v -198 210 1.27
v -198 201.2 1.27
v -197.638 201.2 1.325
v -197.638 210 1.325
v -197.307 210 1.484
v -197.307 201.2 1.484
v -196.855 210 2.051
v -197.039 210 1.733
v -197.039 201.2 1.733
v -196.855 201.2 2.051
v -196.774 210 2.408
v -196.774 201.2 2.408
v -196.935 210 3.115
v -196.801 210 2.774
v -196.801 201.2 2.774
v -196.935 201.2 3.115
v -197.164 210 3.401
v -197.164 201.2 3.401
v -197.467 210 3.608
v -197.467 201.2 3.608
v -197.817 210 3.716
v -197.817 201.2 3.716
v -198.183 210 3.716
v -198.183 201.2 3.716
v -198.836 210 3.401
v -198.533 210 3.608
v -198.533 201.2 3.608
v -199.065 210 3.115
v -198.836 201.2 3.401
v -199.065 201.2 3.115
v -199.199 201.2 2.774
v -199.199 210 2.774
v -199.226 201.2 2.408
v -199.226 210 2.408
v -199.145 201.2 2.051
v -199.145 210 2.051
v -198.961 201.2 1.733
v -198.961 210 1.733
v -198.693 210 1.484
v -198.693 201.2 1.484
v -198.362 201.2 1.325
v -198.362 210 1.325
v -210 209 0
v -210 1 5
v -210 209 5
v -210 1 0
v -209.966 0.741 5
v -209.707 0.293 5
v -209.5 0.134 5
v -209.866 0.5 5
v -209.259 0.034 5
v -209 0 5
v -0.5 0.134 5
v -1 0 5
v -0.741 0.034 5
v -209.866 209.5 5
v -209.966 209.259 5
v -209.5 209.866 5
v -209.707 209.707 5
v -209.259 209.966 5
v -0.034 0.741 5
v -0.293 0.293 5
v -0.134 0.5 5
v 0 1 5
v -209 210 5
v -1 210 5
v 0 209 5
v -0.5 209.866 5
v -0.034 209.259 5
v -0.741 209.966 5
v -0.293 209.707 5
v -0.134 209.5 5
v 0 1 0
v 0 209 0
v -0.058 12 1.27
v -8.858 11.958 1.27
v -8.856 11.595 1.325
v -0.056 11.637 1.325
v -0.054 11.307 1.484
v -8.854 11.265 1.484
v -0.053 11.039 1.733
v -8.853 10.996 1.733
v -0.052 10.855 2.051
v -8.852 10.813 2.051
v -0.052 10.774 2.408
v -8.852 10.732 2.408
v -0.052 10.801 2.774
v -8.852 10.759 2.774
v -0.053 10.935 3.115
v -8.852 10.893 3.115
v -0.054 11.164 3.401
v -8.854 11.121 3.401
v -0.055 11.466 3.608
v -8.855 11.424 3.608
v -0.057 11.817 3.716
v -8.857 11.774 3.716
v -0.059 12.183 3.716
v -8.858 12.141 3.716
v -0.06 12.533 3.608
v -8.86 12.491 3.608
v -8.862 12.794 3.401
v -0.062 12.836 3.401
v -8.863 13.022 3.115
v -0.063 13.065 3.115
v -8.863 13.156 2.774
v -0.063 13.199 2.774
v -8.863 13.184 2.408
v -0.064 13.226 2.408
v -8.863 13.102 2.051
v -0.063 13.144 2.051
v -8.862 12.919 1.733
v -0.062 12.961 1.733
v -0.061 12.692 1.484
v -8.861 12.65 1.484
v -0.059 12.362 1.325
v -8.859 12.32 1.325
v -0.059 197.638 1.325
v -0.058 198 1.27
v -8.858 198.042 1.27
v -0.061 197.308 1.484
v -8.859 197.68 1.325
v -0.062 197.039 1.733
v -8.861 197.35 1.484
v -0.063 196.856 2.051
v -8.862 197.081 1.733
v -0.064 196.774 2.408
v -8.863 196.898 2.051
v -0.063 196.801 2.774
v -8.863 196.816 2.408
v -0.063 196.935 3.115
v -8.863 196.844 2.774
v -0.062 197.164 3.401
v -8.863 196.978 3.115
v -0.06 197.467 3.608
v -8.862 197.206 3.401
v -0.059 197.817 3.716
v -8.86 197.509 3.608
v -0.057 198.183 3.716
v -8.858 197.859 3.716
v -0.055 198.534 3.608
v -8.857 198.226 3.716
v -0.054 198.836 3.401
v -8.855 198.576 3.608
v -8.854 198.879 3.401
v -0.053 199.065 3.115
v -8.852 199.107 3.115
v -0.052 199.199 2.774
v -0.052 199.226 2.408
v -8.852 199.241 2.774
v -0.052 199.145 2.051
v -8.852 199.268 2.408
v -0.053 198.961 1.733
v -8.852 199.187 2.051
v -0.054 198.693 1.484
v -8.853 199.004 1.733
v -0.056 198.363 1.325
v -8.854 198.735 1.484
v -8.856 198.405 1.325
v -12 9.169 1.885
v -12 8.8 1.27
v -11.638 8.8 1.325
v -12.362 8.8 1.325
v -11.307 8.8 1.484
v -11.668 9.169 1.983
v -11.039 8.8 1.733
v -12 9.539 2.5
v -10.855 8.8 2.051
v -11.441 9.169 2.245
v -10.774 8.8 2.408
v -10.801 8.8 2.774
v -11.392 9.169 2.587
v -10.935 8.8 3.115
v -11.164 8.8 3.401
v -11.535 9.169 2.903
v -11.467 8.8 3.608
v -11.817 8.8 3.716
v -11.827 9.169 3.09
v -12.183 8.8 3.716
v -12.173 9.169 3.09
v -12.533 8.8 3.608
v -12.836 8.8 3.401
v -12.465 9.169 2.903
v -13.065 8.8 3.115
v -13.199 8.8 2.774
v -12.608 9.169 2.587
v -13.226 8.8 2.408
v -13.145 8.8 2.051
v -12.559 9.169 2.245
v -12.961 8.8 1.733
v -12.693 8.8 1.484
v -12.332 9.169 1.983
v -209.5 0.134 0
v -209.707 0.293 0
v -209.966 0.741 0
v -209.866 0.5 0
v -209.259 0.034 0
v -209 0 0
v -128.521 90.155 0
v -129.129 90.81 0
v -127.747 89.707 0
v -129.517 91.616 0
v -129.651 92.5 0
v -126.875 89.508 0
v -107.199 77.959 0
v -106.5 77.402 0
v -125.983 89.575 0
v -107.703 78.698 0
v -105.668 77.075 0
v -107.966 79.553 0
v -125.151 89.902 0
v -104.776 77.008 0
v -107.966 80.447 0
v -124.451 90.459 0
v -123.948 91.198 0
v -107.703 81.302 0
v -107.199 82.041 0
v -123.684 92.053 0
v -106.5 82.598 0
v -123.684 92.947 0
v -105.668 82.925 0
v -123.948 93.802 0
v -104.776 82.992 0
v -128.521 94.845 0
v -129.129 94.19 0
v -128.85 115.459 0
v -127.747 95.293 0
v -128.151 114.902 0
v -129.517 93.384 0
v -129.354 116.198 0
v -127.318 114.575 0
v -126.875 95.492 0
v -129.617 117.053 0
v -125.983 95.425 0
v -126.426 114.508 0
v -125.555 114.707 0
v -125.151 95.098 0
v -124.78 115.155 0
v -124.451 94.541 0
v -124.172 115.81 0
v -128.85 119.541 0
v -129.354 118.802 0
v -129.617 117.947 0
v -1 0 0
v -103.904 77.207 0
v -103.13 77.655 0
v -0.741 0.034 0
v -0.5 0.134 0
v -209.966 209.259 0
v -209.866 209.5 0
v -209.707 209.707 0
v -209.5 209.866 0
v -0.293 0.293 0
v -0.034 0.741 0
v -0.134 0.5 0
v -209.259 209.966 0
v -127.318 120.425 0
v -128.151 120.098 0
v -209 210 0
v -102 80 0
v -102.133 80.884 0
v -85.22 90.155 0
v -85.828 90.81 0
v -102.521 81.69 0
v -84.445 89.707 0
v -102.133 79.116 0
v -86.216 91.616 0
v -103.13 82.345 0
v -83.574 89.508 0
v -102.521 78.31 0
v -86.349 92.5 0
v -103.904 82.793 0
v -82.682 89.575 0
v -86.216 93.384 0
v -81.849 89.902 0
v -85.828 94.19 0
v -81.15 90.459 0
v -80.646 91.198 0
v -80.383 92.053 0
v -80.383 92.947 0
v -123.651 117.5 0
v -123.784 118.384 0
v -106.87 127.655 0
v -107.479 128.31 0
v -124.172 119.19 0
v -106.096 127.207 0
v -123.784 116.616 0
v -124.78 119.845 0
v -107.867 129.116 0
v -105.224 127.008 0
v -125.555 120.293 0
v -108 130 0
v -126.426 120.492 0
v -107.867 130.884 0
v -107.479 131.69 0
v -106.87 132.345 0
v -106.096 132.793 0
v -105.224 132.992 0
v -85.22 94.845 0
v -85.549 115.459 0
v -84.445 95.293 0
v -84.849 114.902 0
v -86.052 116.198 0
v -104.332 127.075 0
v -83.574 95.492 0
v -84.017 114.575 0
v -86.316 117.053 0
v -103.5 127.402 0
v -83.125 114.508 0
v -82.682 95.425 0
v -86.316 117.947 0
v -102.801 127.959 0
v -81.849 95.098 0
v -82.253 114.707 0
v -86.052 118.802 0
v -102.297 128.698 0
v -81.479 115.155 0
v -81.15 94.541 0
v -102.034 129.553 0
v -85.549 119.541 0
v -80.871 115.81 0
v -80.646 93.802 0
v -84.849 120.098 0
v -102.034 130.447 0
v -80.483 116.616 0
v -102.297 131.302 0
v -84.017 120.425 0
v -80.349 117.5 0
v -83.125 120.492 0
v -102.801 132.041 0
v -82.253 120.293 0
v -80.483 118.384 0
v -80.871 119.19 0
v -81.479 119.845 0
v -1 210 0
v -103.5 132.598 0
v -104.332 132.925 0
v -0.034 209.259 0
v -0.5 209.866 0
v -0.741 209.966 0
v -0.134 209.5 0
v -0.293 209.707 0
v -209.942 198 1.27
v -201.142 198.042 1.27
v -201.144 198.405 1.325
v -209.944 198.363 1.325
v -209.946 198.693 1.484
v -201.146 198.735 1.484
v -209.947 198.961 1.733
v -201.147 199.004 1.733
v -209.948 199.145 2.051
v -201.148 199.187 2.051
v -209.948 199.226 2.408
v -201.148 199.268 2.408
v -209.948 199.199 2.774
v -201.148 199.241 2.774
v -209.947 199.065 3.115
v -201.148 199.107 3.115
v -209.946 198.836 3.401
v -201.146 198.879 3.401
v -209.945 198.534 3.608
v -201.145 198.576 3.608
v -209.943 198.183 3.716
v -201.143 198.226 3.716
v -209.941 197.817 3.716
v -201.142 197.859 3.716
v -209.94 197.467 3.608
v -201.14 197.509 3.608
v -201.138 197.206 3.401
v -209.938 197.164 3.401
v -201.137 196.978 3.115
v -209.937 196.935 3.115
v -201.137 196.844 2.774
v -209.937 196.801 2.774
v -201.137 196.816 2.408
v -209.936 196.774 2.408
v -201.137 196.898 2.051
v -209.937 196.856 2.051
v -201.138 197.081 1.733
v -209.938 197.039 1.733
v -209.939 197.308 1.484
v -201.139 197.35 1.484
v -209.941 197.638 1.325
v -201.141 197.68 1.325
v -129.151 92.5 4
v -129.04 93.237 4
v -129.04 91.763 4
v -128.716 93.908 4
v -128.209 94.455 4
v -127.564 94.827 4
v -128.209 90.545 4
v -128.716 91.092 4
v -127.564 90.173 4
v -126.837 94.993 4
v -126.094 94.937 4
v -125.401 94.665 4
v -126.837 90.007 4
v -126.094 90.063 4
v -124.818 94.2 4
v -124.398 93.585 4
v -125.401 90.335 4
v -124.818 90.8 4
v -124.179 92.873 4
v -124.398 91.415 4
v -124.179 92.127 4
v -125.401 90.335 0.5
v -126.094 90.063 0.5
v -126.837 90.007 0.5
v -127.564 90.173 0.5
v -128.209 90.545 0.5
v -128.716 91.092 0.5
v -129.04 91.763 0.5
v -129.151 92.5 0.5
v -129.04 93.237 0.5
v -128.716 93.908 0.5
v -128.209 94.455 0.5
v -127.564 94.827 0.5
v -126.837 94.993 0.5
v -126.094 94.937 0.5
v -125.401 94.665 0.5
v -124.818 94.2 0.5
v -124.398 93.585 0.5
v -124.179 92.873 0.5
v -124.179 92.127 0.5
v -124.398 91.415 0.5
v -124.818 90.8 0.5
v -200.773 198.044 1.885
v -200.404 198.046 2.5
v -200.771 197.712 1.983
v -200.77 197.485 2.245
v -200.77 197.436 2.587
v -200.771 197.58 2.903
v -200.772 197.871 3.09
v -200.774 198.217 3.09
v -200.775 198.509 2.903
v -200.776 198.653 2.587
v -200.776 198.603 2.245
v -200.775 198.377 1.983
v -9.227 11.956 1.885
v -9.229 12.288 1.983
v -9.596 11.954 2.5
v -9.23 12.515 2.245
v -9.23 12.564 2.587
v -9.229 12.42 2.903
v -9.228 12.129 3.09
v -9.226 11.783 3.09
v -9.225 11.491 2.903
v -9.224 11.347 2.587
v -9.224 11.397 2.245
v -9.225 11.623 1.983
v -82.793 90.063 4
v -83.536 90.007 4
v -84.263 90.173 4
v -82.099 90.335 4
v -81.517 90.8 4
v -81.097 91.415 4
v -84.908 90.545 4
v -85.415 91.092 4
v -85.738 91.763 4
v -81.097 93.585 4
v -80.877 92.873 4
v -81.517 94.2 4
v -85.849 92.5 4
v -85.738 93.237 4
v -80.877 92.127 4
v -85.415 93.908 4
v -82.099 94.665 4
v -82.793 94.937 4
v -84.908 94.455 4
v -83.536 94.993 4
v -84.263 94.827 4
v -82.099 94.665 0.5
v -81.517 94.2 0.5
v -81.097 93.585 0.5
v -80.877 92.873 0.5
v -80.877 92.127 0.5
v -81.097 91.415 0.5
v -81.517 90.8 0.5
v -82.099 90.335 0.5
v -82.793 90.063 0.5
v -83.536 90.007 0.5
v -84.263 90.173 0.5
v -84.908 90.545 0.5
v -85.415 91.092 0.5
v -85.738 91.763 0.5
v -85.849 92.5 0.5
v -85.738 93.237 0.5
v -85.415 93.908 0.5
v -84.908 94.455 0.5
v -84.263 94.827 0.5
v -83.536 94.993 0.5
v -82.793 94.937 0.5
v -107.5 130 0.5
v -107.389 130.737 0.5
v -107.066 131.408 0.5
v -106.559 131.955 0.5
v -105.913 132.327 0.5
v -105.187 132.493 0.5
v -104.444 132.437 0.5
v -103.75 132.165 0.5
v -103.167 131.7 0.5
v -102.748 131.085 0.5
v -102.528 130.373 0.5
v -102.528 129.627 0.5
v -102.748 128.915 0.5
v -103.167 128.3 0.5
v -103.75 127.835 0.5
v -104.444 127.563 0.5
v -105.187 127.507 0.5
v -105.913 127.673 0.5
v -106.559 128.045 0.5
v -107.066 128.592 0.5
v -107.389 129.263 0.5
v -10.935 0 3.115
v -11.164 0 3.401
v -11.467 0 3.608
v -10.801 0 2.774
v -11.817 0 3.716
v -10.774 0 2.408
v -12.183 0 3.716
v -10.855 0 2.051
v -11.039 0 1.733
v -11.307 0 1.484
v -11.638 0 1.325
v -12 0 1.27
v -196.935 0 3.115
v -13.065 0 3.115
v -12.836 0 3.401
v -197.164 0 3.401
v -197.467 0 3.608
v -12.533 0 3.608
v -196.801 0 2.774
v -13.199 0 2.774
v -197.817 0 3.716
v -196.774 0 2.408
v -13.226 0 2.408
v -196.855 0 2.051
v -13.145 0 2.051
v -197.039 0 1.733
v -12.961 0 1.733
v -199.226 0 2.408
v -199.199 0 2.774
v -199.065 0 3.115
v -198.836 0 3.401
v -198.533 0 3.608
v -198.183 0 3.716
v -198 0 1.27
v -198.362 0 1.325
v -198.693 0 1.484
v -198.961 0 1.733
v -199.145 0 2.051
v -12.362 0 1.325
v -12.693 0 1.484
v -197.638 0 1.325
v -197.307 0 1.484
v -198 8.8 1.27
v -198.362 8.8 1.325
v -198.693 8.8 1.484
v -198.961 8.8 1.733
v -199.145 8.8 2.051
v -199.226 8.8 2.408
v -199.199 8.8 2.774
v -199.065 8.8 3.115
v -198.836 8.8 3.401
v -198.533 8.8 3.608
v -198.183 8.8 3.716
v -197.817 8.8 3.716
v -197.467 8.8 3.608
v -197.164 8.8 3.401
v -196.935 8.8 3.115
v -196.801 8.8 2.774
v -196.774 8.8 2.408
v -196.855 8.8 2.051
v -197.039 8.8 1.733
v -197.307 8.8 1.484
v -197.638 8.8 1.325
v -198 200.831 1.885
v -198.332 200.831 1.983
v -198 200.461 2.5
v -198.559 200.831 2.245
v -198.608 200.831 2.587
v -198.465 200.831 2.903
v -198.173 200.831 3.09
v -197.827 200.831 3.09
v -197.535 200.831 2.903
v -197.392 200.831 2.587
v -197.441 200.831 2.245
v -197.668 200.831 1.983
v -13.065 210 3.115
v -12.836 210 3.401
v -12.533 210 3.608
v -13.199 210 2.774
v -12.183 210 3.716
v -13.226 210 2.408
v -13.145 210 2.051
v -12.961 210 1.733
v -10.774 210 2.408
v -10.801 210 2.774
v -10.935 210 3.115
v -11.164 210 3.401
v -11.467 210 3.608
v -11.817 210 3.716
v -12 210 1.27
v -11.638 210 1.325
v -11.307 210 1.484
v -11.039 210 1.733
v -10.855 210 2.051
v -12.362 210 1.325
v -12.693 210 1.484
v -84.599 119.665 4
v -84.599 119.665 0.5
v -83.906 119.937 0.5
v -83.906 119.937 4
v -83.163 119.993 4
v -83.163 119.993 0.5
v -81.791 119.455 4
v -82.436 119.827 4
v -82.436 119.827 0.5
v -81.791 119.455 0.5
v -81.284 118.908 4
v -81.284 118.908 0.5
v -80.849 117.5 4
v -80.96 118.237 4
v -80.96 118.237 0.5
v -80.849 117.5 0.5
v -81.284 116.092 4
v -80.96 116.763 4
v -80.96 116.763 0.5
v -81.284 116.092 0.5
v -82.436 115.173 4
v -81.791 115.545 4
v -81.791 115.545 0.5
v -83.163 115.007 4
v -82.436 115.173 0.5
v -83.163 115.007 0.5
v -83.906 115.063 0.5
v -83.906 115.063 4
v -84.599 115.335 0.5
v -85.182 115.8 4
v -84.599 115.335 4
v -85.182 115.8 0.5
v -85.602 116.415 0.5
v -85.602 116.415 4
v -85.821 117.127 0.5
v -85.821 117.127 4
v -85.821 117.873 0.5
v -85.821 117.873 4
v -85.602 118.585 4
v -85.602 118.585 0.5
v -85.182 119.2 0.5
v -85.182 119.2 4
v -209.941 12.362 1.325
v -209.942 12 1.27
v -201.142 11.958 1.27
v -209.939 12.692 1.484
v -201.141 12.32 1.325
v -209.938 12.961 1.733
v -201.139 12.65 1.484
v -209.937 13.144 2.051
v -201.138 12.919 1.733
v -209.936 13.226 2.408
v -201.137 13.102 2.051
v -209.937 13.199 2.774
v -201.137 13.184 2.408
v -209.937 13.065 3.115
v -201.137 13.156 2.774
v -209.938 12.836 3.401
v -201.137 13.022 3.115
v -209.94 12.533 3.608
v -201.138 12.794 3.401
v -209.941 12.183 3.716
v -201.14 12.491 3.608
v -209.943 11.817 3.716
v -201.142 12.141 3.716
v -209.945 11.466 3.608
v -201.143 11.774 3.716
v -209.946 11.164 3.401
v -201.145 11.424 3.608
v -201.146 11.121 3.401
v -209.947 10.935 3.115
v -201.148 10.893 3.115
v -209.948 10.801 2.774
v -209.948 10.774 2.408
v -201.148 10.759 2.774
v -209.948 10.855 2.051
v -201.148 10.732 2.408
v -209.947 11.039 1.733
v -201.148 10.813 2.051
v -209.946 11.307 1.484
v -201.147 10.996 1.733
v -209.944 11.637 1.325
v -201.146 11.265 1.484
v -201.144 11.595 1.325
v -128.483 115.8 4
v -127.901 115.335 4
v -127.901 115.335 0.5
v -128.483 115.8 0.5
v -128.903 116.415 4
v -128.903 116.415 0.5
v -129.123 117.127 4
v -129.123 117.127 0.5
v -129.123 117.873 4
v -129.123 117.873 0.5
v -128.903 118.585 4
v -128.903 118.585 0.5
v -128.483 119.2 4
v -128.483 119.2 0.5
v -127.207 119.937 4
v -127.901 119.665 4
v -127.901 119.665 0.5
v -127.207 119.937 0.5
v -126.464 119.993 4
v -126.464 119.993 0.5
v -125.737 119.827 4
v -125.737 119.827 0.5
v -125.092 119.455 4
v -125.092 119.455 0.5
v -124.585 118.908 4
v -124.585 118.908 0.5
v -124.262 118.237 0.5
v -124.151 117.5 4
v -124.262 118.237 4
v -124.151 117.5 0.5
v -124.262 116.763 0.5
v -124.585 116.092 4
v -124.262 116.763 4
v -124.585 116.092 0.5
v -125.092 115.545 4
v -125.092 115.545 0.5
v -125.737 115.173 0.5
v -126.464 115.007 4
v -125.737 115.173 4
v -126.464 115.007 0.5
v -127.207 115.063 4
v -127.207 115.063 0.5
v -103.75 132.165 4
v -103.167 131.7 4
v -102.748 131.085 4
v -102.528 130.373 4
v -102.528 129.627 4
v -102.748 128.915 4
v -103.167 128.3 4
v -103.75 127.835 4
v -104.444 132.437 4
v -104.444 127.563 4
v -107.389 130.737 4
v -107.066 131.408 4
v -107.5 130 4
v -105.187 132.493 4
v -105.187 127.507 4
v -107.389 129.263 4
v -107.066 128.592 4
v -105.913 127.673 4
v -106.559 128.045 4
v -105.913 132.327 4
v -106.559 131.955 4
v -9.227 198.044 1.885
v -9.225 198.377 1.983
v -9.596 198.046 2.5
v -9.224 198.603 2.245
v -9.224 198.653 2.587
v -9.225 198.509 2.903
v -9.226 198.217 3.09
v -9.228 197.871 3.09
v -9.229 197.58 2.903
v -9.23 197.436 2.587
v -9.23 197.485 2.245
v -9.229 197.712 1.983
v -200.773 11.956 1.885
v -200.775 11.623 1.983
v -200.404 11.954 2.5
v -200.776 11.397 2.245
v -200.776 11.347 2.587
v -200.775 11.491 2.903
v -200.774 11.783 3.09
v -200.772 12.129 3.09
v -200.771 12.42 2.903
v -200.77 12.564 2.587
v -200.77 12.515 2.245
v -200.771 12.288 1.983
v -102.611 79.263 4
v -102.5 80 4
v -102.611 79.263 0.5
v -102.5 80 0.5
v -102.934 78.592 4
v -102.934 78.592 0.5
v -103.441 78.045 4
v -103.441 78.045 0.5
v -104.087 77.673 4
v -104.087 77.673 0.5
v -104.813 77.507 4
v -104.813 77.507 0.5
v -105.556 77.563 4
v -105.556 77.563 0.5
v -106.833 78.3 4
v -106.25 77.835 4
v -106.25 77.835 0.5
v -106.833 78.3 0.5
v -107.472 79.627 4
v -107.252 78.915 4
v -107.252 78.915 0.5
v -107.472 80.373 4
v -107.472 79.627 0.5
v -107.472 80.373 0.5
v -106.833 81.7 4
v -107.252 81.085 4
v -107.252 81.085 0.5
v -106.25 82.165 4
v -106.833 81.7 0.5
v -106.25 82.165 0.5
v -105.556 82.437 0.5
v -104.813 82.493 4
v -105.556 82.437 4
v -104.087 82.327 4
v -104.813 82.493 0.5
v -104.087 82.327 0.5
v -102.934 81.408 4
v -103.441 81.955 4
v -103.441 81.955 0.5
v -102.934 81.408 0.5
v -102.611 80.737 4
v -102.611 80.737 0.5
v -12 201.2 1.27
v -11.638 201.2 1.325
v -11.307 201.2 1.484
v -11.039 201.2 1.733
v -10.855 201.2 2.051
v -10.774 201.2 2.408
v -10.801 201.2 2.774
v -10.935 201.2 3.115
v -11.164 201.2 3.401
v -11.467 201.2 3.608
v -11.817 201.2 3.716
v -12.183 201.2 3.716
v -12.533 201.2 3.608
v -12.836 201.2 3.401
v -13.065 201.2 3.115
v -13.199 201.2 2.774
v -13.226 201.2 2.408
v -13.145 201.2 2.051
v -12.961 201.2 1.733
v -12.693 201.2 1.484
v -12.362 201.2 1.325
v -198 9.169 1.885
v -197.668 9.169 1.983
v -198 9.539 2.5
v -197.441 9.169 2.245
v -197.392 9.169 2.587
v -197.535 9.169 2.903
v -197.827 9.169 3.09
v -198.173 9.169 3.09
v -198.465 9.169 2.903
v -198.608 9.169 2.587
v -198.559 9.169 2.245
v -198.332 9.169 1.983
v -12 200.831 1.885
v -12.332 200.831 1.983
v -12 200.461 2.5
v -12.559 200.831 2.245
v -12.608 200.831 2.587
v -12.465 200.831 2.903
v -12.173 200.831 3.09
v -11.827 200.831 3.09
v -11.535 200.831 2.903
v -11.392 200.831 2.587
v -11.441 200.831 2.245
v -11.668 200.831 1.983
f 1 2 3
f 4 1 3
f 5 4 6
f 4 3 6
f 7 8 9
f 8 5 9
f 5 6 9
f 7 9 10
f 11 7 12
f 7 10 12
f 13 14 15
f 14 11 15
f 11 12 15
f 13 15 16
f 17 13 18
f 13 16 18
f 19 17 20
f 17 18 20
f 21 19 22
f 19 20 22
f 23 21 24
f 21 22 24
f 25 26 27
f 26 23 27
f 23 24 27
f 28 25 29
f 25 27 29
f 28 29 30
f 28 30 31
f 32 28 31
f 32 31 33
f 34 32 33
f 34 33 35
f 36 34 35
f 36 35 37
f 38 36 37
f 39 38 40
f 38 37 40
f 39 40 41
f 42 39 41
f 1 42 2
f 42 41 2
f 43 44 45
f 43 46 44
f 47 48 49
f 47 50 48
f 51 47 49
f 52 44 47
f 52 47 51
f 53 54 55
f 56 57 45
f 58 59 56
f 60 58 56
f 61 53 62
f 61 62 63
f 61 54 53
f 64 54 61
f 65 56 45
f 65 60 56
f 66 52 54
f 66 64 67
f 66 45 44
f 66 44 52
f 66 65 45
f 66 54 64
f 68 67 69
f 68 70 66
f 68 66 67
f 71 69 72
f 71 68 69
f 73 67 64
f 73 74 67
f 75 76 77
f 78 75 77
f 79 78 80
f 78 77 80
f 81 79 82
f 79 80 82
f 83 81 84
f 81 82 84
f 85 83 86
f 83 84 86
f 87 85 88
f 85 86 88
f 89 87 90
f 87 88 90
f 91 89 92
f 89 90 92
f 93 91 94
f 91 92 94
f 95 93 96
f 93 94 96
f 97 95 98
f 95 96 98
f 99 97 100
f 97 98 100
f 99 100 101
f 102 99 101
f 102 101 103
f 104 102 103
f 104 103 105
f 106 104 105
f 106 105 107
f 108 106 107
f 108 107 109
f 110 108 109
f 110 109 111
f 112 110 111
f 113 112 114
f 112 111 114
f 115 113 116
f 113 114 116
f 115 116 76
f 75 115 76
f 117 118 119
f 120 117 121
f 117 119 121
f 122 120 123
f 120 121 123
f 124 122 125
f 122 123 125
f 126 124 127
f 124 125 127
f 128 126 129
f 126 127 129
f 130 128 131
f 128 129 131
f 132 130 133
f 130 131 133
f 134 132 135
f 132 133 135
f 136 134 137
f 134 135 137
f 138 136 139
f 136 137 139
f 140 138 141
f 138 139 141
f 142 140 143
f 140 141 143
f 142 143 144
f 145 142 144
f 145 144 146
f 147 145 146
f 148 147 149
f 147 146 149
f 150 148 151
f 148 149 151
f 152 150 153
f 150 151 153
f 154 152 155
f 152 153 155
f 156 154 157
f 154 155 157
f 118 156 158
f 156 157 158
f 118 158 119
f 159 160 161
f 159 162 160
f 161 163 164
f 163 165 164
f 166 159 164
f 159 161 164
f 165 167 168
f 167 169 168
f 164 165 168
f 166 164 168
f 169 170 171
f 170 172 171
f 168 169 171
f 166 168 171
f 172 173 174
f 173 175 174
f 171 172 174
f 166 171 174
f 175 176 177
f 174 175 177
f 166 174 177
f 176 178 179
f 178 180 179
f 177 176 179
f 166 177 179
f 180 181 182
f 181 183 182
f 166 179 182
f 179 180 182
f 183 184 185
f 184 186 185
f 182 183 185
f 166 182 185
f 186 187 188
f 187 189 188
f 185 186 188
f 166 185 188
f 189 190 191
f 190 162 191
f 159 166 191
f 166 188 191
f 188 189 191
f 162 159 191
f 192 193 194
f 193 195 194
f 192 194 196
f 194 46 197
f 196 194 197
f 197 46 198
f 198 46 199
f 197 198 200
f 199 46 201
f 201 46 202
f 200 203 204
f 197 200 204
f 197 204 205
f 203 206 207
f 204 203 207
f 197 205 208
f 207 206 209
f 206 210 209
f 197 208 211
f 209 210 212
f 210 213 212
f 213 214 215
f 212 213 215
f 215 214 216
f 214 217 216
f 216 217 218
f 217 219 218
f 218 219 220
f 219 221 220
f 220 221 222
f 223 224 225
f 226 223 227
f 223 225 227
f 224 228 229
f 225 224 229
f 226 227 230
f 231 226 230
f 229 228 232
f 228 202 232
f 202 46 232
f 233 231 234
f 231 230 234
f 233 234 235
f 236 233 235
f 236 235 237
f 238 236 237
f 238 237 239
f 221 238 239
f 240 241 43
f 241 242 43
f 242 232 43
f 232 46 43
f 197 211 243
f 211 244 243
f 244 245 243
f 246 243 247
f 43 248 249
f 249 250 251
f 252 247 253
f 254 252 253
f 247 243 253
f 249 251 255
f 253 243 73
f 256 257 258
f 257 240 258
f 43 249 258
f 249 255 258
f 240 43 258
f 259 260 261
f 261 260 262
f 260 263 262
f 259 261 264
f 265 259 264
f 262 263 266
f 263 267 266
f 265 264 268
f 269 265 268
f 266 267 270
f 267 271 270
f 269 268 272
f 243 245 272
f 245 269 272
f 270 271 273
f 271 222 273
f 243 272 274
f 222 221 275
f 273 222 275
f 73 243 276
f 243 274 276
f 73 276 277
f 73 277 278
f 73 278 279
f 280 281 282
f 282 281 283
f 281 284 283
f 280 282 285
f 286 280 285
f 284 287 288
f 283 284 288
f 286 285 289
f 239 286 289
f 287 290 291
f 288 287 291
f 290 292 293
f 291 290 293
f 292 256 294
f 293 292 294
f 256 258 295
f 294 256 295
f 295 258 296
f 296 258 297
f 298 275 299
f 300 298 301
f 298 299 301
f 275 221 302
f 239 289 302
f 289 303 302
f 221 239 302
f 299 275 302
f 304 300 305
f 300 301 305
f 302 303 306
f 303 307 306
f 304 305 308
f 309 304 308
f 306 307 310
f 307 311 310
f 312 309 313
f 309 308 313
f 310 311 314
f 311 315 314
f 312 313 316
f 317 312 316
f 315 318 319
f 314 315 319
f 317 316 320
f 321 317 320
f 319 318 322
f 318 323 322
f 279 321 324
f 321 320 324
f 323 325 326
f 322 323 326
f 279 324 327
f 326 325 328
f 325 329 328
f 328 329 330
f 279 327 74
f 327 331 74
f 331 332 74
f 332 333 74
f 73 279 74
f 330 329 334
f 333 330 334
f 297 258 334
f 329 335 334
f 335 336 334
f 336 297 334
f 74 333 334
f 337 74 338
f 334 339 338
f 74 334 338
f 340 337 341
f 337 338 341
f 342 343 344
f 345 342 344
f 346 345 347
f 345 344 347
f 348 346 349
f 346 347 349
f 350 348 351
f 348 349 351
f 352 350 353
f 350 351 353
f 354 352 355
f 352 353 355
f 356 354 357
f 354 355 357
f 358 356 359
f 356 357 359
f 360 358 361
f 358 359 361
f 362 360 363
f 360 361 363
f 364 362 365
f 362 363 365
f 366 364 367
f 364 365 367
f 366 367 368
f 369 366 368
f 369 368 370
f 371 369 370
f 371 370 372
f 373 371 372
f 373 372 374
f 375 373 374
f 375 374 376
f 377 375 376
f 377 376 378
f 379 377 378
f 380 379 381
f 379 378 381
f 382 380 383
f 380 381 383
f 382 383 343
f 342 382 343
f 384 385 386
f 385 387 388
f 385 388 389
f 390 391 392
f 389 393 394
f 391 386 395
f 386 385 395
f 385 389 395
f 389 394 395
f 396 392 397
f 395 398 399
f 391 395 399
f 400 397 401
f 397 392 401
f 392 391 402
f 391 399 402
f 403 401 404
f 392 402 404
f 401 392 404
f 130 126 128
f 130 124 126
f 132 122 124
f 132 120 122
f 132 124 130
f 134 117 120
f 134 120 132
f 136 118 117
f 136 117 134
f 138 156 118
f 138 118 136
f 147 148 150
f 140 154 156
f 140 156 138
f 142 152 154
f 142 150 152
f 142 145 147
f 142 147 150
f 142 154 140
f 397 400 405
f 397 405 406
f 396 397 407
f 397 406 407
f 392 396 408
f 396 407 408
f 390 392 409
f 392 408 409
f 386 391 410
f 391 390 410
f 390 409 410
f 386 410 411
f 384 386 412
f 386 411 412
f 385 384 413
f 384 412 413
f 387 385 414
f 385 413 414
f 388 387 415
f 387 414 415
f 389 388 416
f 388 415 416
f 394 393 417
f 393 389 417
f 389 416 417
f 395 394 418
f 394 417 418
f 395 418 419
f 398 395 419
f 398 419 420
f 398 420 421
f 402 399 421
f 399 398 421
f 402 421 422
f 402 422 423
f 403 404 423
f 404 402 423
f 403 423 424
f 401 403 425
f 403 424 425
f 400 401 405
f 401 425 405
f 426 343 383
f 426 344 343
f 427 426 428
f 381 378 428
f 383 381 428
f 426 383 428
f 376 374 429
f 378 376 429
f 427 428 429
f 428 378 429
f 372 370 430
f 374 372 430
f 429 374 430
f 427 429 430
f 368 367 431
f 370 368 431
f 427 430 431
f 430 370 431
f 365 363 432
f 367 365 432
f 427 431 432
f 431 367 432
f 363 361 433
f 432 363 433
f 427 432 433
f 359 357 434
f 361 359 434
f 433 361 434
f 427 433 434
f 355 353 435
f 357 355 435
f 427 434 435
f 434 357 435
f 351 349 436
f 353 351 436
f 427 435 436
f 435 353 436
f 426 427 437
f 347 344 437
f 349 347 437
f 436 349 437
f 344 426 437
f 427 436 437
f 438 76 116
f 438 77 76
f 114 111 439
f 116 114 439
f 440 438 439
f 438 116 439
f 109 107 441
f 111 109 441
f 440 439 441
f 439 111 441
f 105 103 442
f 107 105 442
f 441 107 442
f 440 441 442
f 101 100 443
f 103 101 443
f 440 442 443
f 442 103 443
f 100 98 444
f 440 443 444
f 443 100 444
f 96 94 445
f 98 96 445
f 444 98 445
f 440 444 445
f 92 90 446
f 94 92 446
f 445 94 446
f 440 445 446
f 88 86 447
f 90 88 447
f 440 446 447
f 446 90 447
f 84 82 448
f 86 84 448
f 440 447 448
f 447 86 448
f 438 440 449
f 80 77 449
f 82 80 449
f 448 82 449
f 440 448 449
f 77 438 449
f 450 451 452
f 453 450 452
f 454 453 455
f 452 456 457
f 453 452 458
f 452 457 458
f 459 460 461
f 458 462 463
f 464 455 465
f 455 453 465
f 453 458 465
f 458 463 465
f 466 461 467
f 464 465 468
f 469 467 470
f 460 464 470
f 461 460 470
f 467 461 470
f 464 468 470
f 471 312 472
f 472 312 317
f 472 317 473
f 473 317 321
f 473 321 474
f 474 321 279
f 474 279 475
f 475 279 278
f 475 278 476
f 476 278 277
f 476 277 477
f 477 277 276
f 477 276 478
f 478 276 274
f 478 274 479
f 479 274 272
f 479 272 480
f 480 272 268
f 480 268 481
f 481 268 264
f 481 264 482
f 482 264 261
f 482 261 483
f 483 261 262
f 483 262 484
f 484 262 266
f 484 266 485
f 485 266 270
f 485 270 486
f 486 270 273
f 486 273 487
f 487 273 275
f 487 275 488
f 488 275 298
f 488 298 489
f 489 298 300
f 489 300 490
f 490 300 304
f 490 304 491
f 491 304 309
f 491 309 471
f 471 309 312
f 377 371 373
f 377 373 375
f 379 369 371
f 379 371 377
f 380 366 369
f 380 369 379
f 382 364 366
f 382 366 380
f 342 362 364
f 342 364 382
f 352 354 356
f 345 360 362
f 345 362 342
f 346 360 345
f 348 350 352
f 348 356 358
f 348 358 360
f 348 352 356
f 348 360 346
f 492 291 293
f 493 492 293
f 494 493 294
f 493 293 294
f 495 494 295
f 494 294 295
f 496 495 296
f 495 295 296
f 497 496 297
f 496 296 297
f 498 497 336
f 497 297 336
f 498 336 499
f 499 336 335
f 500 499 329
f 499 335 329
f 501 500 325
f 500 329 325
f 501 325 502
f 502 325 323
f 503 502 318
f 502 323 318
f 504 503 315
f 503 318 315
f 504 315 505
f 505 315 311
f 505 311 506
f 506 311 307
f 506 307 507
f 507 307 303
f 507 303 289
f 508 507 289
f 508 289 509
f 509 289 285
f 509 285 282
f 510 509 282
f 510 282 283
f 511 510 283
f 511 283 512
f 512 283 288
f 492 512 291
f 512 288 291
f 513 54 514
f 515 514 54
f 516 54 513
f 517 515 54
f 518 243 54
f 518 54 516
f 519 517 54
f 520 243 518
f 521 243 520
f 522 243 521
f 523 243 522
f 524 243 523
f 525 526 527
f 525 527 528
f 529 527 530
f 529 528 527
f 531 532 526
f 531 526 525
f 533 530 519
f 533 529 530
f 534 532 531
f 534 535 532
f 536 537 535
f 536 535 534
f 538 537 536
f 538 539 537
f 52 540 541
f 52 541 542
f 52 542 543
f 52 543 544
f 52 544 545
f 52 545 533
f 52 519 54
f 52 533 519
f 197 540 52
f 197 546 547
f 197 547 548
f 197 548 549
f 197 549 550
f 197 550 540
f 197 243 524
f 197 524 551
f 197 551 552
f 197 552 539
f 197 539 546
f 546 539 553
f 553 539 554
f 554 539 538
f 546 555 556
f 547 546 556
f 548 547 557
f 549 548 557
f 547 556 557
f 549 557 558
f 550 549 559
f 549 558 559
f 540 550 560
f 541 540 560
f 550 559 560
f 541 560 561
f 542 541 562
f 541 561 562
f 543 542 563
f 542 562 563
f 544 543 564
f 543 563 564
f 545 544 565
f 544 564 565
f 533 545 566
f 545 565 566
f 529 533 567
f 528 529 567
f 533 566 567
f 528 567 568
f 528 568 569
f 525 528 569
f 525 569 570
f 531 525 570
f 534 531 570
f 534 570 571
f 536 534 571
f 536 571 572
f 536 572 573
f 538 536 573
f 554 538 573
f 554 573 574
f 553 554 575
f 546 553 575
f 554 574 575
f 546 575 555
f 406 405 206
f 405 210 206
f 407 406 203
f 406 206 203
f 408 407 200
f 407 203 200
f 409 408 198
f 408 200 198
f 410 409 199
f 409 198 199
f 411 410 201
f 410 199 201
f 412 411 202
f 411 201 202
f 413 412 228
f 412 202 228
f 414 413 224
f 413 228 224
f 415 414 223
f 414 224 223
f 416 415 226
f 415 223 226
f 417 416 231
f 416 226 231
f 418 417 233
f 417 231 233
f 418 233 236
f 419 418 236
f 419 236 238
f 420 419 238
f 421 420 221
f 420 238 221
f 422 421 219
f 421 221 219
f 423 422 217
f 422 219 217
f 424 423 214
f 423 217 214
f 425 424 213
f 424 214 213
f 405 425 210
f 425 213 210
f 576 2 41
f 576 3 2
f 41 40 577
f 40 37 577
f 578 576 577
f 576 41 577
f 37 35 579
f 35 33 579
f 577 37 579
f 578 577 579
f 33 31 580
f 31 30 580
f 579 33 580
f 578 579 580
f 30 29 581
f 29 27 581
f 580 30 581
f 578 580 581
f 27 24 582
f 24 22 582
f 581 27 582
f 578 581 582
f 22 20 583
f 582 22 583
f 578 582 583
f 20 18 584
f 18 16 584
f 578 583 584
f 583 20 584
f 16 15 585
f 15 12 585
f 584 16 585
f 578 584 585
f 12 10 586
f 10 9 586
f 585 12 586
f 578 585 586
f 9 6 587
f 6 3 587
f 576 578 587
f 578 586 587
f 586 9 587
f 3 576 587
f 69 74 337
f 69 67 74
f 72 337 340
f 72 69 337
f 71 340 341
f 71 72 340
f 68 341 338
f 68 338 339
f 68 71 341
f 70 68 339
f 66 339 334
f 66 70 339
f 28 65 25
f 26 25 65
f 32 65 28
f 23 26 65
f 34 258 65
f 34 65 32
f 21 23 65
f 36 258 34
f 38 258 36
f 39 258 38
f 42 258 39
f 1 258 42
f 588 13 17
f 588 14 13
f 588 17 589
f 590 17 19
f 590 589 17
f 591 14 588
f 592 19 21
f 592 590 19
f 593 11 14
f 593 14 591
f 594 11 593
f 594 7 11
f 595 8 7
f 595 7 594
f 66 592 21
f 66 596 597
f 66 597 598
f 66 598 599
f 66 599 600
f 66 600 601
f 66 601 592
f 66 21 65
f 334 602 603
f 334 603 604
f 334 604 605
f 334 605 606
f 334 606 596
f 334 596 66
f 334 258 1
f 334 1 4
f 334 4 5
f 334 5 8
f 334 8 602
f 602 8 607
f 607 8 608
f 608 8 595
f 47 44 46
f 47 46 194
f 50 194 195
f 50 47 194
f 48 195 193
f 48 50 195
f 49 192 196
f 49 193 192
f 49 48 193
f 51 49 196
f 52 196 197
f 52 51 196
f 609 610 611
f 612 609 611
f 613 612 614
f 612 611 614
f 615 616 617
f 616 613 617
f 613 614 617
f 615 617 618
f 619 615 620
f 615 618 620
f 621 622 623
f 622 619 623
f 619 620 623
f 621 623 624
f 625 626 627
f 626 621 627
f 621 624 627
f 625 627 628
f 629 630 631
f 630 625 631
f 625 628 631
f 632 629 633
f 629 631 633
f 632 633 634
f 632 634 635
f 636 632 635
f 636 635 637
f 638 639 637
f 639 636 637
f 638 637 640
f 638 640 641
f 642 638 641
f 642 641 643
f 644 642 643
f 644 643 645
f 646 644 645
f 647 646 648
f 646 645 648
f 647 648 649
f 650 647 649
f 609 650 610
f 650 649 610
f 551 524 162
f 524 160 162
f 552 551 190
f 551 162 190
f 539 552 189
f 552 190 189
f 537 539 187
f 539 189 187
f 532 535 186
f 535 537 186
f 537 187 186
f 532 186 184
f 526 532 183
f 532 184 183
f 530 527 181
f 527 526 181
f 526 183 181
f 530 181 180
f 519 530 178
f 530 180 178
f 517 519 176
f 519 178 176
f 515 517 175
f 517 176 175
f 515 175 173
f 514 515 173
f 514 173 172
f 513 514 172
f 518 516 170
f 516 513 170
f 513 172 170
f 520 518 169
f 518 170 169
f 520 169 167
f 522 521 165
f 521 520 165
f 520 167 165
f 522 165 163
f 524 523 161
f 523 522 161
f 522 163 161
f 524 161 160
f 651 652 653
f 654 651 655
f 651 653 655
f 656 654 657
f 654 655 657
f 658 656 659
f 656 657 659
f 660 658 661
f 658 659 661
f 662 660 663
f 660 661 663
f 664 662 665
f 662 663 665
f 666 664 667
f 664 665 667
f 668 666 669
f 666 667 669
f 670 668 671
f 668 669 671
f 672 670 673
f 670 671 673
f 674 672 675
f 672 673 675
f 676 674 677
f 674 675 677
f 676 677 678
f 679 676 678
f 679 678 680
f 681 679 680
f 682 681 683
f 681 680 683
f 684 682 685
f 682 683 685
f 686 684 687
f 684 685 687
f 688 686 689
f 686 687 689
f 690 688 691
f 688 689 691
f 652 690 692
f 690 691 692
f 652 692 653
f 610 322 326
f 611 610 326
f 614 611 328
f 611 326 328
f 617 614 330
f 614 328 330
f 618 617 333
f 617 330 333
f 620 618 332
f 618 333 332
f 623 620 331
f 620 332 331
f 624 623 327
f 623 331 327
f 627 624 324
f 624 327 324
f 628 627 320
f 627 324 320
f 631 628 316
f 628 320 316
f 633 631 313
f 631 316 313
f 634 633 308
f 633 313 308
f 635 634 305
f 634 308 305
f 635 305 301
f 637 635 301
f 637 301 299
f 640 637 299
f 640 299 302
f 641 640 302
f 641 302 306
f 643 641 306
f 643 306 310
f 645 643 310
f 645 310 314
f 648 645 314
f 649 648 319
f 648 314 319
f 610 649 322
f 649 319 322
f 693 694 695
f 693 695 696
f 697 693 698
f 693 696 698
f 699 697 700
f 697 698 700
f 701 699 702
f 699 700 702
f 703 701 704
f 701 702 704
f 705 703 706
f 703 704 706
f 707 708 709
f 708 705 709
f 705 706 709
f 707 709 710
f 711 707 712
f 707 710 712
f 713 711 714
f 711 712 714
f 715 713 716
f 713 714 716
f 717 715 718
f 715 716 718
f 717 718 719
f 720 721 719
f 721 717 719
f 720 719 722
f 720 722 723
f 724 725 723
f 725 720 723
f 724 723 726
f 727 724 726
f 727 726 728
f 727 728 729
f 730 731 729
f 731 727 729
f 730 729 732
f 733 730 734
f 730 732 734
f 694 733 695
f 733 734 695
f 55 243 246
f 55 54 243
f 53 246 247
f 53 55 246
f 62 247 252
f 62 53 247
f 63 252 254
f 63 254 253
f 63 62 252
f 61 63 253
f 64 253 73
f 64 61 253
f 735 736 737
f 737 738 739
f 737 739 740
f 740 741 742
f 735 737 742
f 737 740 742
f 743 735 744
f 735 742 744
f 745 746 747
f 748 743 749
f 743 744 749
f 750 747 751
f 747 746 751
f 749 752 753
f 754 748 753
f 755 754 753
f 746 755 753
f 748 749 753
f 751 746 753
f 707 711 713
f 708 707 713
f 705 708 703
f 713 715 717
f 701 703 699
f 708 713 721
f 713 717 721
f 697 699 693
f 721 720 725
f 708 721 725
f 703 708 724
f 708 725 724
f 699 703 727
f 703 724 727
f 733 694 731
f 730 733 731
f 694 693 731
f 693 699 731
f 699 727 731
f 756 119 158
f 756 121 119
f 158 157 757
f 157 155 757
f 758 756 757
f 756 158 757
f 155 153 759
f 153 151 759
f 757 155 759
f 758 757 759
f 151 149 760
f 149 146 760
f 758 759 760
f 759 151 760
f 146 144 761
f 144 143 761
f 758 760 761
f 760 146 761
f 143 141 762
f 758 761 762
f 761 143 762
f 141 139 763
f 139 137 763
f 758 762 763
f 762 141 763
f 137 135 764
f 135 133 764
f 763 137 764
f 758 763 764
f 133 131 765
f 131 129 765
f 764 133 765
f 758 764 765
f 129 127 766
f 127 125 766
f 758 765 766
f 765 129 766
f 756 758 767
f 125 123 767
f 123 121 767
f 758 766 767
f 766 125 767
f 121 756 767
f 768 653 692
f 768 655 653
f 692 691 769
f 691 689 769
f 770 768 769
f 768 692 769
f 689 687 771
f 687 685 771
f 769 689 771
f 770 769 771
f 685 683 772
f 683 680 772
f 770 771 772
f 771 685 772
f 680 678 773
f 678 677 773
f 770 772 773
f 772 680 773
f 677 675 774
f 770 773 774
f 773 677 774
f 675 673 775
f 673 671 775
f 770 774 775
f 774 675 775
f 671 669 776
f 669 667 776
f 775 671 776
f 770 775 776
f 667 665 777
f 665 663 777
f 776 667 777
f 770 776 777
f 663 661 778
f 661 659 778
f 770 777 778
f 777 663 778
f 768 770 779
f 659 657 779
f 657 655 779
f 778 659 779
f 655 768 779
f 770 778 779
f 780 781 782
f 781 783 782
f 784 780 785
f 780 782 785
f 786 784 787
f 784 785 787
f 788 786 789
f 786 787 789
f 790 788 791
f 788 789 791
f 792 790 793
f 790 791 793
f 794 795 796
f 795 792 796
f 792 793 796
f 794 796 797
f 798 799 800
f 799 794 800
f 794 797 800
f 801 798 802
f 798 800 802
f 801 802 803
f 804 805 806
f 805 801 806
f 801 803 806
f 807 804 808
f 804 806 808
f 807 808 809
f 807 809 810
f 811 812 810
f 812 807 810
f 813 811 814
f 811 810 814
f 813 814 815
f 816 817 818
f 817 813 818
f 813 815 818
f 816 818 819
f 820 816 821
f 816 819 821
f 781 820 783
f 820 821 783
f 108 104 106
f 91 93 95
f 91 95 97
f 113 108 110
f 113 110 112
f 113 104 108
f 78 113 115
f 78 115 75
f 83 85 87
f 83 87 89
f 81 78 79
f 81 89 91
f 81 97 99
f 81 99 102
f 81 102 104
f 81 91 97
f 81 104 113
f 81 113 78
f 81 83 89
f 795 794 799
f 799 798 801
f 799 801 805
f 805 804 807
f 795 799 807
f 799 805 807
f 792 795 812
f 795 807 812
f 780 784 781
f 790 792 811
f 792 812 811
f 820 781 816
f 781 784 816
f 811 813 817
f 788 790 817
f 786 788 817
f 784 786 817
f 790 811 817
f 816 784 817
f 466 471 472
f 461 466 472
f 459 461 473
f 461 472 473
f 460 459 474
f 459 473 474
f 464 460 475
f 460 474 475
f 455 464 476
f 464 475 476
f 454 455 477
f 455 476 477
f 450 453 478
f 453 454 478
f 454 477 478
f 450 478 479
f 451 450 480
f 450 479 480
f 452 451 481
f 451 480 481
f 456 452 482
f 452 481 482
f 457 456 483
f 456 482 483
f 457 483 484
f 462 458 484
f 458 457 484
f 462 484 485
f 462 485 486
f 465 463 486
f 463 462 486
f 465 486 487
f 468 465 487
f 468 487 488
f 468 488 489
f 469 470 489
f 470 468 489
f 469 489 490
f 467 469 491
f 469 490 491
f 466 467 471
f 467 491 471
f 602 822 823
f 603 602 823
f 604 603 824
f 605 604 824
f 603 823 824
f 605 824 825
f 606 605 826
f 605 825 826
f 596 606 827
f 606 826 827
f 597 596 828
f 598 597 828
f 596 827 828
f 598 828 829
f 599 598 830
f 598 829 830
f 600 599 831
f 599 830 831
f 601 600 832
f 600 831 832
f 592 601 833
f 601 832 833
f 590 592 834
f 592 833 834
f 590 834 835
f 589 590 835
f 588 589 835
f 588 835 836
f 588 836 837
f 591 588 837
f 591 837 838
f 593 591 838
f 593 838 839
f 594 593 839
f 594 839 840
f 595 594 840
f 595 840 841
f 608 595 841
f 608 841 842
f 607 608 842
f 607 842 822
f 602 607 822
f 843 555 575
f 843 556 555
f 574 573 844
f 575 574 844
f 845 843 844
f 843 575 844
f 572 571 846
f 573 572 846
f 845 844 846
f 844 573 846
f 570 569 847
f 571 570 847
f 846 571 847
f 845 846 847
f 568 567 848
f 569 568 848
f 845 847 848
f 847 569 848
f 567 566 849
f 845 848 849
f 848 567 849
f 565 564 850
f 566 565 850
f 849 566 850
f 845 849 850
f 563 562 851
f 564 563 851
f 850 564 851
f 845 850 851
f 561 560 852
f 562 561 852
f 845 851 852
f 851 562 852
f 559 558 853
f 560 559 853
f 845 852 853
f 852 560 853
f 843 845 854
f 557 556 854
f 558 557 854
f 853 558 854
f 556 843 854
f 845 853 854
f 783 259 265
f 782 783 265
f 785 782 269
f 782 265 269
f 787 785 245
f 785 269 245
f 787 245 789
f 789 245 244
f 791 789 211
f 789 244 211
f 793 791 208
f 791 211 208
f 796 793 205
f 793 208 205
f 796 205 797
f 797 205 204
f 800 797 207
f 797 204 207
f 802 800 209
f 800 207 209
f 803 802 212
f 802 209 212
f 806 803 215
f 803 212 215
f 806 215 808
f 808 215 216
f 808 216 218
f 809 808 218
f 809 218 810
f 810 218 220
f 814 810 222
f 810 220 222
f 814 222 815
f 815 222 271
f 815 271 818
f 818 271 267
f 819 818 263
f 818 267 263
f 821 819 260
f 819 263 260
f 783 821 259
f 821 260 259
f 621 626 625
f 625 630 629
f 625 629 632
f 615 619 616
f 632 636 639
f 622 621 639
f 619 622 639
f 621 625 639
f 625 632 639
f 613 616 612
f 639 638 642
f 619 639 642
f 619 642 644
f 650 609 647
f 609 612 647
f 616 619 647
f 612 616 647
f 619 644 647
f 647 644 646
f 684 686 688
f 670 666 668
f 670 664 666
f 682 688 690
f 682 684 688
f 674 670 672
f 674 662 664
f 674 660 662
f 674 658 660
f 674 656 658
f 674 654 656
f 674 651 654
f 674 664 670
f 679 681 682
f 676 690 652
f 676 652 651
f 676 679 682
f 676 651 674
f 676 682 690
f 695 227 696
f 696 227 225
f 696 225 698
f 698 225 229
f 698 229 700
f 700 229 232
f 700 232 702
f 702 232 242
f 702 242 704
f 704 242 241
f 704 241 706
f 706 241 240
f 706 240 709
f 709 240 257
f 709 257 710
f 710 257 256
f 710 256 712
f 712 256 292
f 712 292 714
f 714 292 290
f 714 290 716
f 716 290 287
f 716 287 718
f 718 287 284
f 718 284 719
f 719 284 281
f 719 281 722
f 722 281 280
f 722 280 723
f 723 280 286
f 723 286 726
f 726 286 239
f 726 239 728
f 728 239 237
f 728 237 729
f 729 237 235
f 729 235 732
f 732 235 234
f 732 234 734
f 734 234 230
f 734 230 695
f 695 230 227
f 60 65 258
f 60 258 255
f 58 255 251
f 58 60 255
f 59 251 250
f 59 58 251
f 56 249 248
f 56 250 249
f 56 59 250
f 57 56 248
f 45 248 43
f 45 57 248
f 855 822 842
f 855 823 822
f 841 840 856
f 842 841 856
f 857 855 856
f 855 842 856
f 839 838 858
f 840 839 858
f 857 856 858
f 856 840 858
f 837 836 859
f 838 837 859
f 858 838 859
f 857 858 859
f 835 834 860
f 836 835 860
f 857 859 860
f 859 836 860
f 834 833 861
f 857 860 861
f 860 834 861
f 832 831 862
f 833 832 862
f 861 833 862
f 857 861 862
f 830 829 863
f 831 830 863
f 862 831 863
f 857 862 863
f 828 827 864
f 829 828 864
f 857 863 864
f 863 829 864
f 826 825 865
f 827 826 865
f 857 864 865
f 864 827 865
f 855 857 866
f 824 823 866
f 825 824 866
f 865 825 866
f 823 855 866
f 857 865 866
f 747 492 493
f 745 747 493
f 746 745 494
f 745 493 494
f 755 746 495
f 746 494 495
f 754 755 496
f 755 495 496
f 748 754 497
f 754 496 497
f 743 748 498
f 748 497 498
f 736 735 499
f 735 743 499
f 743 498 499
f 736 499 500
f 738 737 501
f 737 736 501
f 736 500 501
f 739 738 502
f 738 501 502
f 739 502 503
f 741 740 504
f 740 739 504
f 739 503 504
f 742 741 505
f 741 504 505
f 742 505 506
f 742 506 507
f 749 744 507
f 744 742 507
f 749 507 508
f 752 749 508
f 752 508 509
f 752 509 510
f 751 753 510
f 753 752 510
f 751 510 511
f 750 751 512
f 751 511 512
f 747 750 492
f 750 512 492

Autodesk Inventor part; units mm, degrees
sketch "Skizze3" plane through (0, 0, 0) normal (0, 0, 1) x (1, 0, 0)
  line L0 (0, 0) -> (-210, 0)
  line L1 (-210, 0) -> (-210, 210)
  line L2 (-210, 210) -> (0, 210)
  line L3 (0, 210) -> (0, 0)
  line L4 (0, 0) -> (-210, 210) construction
  line L5 (-210, 0) -> (0, 210) construction
  circle A0 centre (-105, 80) radius 2.5
  line L6 (-105, 58.1482) -> (-105, 151.8518) construction
  point P0 (-105, 105)
  point P1 (-105, 105)
  dimension "d4" = 210
  dimension "d5" = 210
  dimension "d10" = 5
  dimension "d11" = 25
extrude "Extrusion3" add sketch "Skizze3" along normal blind 5 contours L0 L1 L2 L3 | A0
fillet "Rundung1" radius 1 4 edges at (-210, 210, 2.5) (-210, 0, 2.5) (0, 0, 2.5) (0, 210, 2.5)
extrude "Extrusion4" cut sketch "Skizze3" along normal blind 4 contours A0
chamfer "Fase1" distance 0.5 angle 45 1 edges at (-107.5, 80, 0)
pattern_circular "Runde Anordnung1" count 6 over 360 about axis through (-105, 105, 0) along (0, 0, 1) of "Extrusion4", "Fase1"
sketch "Skizze5" plane through (-209, 0, 0) normal (0, -1, 0) x (1, 0, 0)
  line L0 (-1, 5) -> (-1, 0) projected
  line L1 (0, 0) -> (208, 0) projected
  line L2 (-2.4185, 2.5) -> (7.6142, 2.5) construction
  point P0 (209, 0)
  point P1 (11, 2.5)
  point P2 (-1, 2.5)
  dimension "d21" = 12
ref_plane "Arbeitsebene2" through (-210, 0, 2.5) normal (-0.7054, 0.7088, 0) x (0.7088, 0.7054, 0)
hole "Bohrung1" at (-198, 0, 2.5) direction (0, 1, 0) diameter 2.459 depth 8.8 tip angle 118 thread size "M3x0.5" class "6H" standard "ISO Metric profile"
mirror "Spiegeln2" about plane through (-210, 0, 2.5) normal (-0.7054, 0.7088, 0) of "Bohrung1"
ref_plane "Arbeitsebene3" through (-105, 0, 5) normal (1, 0, 0) x (0, 1, 0)
ref_plane "Arbeitsebene4" through (-210, 105, 5) normal (0, -1, 0) x (1, 0, 0)
mirror "Spiegeln3" about plane through (-105, 0, 5) normal (1, 0, 0) of "Bohrung1", "Spiegeln2"
mirror "Spiegeln4" about plane through (-210, 105, 5) normal (0, -1, 0) of "Bohrung1", "Spiegeln2", "Spiegeln3"
equation "\"d5\" = d4"
properties part number "BT403_trajan20_21" material "Acryl"
